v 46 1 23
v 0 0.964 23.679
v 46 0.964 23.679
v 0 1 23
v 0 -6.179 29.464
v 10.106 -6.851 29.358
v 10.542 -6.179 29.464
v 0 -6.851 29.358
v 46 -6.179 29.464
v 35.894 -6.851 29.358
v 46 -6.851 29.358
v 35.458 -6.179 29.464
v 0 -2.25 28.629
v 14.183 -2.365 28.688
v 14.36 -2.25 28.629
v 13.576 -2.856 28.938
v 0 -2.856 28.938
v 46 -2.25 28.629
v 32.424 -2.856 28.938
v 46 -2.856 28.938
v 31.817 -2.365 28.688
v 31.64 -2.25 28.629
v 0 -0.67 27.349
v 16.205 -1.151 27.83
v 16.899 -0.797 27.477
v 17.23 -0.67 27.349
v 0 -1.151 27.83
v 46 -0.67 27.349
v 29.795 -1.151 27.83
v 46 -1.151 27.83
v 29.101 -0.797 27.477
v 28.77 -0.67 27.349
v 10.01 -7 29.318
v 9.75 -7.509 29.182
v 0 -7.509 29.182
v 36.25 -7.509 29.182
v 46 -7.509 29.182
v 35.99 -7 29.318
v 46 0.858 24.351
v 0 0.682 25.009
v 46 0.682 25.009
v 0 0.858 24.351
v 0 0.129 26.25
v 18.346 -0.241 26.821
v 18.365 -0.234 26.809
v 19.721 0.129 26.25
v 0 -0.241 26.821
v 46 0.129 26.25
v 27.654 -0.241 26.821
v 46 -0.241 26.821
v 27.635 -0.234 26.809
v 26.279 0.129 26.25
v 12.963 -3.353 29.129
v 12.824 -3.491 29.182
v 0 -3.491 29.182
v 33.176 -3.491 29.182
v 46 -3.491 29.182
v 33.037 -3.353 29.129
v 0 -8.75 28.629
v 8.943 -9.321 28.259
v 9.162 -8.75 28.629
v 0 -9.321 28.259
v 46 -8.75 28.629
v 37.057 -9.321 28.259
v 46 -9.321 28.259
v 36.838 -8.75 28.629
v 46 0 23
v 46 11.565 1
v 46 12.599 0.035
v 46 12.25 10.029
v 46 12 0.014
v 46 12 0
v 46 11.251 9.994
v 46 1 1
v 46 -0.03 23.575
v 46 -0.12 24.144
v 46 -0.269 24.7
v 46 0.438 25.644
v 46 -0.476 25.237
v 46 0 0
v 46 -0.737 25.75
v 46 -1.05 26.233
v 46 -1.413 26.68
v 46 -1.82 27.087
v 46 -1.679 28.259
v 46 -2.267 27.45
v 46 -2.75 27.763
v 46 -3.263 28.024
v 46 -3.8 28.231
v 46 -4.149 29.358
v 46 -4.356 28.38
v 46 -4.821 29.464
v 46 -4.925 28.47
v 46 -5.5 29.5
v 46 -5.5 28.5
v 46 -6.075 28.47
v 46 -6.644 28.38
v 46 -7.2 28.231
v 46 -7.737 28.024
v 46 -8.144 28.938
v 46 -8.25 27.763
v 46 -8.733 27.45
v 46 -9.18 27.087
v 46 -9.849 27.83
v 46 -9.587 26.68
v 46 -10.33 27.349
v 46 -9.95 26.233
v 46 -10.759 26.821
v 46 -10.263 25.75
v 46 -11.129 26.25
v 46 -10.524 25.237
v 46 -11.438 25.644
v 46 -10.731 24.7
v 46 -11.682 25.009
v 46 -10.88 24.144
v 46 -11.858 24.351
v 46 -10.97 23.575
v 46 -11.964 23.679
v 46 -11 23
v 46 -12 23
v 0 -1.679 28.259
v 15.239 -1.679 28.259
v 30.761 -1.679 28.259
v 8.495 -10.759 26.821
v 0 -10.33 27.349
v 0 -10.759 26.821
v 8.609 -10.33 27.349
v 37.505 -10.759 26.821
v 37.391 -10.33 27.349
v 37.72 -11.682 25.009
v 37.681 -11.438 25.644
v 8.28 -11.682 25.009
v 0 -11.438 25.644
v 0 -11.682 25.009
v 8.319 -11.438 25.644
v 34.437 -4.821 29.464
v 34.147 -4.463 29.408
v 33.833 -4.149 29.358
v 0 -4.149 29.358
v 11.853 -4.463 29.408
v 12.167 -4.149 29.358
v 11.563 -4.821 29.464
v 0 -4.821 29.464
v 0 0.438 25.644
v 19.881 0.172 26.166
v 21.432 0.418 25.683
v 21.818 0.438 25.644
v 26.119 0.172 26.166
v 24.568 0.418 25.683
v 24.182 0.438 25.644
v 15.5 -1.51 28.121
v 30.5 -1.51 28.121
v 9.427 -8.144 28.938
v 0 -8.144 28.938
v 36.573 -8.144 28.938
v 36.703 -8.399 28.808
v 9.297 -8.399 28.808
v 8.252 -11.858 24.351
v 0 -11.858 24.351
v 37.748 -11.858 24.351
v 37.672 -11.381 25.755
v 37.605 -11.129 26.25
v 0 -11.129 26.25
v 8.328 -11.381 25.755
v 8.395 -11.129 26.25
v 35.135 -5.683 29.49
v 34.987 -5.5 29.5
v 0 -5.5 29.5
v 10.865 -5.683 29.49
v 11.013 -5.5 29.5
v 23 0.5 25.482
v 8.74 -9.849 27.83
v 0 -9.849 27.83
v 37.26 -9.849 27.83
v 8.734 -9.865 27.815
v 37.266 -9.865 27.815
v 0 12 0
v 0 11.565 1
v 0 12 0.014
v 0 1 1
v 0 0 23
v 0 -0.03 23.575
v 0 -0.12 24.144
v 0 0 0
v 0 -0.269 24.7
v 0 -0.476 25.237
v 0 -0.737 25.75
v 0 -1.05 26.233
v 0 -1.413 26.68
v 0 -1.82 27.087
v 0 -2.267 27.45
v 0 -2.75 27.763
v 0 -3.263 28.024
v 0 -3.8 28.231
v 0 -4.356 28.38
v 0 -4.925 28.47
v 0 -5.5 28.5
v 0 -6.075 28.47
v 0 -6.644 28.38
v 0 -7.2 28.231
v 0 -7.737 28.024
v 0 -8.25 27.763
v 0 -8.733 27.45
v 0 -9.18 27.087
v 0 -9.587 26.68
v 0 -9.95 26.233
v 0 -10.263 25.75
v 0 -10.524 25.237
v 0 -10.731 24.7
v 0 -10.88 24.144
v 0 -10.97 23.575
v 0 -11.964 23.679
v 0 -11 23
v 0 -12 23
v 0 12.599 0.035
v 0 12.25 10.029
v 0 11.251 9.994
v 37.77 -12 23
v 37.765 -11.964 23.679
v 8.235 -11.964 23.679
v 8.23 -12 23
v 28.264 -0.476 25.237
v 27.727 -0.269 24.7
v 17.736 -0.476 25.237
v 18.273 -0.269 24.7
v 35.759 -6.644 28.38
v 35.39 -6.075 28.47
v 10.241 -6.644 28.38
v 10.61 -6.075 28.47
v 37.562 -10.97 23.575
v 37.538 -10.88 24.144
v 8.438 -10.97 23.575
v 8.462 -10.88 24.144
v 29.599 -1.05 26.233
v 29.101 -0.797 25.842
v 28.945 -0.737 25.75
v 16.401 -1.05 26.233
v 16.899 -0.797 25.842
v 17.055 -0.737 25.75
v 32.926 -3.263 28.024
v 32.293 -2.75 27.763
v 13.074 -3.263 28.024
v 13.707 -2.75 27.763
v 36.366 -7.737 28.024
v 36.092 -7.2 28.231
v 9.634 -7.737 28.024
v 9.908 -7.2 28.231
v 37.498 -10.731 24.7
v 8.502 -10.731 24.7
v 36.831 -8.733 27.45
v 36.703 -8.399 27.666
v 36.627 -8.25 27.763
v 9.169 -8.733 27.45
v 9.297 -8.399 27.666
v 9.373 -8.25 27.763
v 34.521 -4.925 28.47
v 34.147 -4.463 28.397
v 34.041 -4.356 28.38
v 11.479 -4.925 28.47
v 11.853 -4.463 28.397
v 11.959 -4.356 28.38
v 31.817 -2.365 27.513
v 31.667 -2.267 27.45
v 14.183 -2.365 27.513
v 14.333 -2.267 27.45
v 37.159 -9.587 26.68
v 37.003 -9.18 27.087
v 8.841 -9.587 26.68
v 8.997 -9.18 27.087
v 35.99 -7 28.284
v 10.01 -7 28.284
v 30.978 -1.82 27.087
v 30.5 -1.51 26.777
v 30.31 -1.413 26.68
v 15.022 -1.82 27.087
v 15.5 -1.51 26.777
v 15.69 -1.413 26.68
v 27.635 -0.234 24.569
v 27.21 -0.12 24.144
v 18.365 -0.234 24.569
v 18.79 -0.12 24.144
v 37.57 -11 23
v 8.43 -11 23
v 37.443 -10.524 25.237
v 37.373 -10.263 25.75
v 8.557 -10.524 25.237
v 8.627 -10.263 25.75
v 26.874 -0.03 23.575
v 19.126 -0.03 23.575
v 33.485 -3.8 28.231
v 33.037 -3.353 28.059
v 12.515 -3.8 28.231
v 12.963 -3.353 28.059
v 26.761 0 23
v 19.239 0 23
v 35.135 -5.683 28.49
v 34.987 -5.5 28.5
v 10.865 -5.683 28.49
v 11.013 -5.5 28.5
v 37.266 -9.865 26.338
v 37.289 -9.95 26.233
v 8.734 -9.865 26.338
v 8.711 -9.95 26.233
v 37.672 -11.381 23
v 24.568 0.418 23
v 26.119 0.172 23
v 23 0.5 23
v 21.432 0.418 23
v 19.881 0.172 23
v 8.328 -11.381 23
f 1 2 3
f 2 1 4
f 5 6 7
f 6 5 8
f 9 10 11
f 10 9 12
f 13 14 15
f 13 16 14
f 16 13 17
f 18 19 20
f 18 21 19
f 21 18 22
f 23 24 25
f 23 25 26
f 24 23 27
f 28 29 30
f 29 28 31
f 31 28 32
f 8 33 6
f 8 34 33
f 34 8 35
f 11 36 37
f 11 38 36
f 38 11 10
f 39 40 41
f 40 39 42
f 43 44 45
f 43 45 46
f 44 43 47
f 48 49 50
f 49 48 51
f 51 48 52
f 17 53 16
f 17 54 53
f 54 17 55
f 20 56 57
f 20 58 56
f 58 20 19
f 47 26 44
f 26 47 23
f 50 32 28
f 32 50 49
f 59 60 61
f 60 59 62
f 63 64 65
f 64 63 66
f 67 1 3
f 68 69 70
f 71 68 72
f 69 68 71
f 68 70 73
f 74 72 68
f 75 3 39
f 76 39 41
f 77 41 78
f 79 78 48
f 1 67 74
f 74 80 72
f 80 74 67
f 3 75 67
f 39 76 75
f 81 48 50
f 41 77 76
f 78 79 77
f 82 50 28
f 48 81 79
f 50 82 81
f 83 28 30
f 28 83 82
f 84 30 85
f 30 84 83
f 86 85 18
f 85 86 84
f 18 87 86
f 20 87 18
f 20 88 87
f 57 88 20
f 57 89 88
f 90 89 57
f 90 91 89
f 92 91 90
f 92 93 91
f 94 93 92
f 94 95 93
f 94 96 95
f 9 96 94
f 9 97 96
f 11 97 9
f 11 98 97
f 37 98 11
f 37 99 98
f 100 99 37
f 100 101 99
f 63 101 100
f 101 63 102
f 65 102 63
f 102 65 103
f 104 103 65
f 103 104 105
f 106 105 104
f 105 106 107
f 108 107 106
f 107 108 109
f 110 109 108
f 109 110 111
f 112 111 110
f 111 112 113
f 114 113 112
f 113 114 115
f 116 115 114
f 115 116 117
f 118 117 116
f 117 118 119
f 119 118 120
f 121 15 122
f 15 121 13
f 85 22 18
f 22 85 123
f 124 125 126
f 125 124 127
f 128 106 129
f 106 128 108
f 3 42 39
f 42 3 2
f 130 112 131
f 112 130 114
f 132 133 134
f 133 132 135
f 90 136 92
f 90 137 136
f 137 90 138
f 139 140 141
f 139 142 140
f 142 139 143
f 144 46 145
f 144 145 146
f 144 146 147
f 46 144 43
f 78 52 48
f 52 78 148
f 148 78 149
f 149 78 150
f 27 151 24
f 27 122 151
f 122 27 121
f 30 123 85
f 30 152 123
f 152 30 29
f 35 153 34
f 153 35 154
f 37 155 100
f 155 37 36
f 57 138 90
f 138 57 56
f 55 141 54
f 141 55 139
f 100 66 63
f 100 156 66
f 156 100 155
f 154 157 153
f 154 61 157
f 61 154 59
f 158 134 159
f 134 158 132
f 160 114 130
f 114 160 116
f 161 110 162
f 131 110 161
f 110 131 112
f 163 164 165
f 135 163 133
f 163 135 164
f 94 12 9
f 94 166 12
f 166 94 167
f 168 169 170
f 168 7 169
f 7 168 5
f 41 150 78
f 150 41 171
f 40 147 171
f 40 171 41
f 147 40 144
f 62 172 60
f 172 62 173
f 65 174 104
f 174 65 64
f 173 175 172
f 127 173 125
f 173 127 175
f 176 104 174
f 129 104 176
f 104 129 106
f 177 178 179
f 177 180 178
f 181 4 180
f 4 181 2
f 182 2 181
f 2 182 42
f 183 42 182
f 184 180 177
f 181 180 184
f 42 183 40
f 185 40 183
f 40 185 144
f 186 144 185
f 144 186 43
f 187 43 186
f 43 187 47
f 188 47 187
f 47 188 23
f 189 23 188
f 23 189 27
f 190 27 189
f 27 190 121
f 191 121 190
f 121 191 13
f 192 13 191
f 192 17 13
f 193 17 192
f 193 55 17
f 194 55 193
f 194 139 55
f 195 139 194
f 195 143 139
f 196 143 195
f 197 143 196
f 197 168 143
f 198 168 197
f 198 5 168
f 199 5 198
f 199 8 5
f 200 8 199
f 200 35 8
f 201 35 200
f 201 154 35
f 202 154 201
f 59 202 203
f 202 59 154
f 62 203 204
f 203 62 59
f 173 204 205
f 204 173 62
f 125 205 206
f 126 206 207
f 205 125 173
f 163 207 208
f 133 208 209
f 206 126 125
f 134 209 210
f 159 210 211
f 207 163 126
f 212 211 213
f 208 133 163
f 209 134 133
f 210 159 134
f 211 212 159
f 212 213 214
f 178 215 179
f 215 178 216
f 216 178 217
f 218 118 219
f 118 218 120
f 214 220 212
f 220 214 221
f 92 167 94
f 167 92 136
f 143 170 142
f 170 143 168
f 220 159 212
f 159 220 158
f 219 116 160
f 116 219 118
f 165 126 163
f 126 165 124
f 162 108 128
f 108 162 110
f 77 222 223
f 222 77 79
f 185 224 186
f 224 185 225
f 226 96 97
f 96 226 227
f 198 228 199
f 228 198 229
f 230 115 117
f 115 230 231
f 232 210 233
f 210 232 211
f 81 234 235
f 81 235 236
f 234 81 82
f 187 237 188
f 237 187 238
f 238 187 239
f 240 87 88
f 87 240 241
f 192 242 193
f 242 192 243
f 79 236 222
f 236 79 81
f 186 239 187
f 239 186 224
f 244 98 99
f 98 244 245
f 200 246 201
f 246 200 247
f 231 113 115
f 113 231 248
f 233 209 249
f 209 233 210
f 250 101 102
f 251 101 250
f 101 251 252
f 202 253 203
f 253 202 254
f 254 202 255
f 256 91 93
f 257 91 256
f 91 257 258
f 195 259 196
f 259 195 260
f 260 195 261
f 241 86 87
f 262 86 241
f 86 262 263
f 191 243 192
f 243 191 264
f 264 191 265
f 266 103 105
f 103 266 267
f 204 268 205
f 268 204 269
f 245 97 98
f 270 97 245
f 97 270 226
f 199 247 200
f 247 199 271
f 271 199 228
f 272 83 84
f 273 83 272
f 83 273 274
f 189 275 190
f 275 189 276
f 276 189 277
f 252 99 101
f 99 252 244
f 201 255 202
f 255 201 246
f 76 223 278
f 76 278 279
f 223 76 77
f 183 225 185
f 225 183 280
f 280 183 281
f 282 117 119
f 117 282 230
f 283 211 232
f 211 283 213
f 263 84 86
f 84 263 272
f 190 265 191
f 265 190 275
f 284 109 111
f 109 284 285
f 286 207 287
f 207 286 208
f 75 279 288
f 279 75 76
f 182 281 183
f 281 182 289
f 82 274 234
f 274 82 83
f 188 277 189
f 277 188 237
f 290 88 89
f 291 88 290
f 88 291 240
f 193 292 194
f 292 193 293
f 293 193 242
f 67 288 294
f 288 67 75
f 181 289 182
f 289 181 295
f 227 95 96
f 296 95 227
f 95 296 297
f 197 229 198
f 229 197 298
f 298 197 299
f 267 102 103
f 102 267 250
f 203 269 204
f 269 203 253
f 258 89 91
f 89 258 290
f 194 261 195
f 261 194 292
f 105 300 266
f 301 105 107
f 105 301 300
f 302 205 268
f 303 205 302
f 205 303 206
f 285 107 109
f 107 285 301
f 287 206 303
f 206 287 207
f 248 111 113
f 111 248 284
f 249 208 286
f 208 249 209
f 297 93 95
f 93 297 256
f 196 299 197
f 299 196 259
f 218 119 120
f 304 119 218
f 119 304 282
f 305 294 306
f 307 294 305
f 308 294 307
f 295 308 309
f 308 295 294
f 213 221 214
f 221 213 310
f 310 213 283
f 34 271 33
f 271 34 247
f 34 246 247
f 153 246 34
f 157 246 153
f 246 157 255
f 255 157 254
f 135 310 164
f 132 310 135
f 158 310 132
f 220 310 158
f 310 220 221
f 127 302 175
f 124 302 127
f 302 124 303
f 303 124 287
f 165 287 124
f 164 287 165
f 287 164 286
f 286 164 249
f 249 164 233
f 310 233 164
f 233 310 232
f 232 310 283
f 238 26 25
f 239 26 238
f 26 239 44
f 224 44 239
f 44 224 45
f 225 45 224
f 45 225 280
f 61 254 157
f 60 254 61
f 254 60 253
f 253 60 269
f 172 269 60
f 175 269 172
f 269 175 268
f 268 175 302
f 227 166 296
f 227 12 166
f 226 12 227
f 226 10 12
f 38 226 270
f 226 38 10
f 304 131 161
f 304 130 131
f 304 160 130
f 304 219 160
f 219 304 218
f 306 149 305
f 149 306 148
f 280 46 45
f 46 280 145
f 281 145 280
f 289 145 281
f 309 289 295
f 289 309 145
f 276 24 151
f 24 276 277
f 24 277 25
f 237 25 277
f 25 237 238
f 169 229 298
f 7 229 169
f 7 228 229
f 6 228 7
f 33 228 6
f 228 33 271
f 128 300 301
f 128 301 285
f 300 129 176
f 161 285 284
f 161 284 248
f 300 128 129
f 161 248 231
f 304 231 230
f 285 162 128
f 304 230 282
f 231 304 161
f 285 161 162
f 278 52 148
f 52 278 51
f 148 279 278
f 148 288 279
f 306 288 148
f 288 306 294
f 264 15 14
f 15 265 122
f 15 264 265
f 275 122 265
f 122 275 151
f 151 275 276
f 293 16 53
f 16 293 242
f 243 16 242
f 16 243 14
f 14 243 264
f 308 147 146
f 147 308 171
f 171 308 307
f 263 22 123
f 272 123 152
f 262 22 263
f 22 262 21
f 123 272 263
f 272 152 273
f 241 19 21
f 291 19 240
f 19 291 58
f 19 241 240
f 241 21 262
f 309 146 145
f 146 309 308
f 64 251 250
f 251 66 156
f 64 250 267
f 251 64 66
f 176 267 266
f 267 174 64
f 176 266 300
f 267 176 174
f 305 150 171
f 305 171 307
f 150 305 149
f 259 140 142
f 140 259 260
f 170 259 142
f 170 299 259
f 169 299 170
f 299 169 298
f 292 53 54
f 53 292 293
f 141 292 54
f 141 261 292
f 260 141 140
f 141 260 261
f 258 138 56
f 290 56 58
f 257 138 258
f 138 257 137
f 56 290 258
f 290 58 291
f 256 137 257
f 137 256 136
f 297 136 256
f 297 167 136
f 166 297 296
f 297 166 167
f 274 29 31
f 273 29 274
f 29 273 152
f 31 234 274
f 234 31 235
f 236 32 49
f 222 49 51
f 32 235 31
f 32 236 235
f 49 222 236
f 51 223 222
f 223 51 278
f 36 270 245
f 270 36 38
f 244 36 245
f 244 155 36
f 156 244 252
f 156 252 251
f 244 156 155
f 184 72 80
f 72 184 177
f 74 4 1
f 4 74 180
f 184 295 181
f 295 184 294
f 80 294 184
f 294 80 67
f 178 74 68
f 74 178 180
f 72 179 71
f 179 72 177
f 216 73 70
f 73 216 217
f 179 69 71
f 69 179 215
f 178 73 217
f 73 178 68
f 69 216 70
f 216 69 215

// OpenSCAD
$fn=60;
THICK=1;
DELTA=0.01;

module wall()
{
     cube([30+8+8,1,23]);
}

module bottom()
{
     cube([30+8+8,11,1]);
}

module back()
{
     cube([30+8+8,1,10]);
}
module hook()
{
     translate([0,-6.5,0])rotate([0,90,0])difference() {
	  cylinder(r=6.5,h=8+30+8);
	  translate([0,0,-DELTA])cylinder(r=6.5-1,h=30+8+8+2*DELTA);
	  translate([0,-10,-DELTA])cube([20,20,30+8+8+DELTA*2]);
	  translate([-20,-9,(8+8+30)/2])rotate([0,90,0])cylinder(d=30,h=100);
     }
}

wall();
translate([0,1,0])bottom();
translate([0,10+2-0.4,0])rotate([2,0,0])back();
translate([0,1,23])hook();
